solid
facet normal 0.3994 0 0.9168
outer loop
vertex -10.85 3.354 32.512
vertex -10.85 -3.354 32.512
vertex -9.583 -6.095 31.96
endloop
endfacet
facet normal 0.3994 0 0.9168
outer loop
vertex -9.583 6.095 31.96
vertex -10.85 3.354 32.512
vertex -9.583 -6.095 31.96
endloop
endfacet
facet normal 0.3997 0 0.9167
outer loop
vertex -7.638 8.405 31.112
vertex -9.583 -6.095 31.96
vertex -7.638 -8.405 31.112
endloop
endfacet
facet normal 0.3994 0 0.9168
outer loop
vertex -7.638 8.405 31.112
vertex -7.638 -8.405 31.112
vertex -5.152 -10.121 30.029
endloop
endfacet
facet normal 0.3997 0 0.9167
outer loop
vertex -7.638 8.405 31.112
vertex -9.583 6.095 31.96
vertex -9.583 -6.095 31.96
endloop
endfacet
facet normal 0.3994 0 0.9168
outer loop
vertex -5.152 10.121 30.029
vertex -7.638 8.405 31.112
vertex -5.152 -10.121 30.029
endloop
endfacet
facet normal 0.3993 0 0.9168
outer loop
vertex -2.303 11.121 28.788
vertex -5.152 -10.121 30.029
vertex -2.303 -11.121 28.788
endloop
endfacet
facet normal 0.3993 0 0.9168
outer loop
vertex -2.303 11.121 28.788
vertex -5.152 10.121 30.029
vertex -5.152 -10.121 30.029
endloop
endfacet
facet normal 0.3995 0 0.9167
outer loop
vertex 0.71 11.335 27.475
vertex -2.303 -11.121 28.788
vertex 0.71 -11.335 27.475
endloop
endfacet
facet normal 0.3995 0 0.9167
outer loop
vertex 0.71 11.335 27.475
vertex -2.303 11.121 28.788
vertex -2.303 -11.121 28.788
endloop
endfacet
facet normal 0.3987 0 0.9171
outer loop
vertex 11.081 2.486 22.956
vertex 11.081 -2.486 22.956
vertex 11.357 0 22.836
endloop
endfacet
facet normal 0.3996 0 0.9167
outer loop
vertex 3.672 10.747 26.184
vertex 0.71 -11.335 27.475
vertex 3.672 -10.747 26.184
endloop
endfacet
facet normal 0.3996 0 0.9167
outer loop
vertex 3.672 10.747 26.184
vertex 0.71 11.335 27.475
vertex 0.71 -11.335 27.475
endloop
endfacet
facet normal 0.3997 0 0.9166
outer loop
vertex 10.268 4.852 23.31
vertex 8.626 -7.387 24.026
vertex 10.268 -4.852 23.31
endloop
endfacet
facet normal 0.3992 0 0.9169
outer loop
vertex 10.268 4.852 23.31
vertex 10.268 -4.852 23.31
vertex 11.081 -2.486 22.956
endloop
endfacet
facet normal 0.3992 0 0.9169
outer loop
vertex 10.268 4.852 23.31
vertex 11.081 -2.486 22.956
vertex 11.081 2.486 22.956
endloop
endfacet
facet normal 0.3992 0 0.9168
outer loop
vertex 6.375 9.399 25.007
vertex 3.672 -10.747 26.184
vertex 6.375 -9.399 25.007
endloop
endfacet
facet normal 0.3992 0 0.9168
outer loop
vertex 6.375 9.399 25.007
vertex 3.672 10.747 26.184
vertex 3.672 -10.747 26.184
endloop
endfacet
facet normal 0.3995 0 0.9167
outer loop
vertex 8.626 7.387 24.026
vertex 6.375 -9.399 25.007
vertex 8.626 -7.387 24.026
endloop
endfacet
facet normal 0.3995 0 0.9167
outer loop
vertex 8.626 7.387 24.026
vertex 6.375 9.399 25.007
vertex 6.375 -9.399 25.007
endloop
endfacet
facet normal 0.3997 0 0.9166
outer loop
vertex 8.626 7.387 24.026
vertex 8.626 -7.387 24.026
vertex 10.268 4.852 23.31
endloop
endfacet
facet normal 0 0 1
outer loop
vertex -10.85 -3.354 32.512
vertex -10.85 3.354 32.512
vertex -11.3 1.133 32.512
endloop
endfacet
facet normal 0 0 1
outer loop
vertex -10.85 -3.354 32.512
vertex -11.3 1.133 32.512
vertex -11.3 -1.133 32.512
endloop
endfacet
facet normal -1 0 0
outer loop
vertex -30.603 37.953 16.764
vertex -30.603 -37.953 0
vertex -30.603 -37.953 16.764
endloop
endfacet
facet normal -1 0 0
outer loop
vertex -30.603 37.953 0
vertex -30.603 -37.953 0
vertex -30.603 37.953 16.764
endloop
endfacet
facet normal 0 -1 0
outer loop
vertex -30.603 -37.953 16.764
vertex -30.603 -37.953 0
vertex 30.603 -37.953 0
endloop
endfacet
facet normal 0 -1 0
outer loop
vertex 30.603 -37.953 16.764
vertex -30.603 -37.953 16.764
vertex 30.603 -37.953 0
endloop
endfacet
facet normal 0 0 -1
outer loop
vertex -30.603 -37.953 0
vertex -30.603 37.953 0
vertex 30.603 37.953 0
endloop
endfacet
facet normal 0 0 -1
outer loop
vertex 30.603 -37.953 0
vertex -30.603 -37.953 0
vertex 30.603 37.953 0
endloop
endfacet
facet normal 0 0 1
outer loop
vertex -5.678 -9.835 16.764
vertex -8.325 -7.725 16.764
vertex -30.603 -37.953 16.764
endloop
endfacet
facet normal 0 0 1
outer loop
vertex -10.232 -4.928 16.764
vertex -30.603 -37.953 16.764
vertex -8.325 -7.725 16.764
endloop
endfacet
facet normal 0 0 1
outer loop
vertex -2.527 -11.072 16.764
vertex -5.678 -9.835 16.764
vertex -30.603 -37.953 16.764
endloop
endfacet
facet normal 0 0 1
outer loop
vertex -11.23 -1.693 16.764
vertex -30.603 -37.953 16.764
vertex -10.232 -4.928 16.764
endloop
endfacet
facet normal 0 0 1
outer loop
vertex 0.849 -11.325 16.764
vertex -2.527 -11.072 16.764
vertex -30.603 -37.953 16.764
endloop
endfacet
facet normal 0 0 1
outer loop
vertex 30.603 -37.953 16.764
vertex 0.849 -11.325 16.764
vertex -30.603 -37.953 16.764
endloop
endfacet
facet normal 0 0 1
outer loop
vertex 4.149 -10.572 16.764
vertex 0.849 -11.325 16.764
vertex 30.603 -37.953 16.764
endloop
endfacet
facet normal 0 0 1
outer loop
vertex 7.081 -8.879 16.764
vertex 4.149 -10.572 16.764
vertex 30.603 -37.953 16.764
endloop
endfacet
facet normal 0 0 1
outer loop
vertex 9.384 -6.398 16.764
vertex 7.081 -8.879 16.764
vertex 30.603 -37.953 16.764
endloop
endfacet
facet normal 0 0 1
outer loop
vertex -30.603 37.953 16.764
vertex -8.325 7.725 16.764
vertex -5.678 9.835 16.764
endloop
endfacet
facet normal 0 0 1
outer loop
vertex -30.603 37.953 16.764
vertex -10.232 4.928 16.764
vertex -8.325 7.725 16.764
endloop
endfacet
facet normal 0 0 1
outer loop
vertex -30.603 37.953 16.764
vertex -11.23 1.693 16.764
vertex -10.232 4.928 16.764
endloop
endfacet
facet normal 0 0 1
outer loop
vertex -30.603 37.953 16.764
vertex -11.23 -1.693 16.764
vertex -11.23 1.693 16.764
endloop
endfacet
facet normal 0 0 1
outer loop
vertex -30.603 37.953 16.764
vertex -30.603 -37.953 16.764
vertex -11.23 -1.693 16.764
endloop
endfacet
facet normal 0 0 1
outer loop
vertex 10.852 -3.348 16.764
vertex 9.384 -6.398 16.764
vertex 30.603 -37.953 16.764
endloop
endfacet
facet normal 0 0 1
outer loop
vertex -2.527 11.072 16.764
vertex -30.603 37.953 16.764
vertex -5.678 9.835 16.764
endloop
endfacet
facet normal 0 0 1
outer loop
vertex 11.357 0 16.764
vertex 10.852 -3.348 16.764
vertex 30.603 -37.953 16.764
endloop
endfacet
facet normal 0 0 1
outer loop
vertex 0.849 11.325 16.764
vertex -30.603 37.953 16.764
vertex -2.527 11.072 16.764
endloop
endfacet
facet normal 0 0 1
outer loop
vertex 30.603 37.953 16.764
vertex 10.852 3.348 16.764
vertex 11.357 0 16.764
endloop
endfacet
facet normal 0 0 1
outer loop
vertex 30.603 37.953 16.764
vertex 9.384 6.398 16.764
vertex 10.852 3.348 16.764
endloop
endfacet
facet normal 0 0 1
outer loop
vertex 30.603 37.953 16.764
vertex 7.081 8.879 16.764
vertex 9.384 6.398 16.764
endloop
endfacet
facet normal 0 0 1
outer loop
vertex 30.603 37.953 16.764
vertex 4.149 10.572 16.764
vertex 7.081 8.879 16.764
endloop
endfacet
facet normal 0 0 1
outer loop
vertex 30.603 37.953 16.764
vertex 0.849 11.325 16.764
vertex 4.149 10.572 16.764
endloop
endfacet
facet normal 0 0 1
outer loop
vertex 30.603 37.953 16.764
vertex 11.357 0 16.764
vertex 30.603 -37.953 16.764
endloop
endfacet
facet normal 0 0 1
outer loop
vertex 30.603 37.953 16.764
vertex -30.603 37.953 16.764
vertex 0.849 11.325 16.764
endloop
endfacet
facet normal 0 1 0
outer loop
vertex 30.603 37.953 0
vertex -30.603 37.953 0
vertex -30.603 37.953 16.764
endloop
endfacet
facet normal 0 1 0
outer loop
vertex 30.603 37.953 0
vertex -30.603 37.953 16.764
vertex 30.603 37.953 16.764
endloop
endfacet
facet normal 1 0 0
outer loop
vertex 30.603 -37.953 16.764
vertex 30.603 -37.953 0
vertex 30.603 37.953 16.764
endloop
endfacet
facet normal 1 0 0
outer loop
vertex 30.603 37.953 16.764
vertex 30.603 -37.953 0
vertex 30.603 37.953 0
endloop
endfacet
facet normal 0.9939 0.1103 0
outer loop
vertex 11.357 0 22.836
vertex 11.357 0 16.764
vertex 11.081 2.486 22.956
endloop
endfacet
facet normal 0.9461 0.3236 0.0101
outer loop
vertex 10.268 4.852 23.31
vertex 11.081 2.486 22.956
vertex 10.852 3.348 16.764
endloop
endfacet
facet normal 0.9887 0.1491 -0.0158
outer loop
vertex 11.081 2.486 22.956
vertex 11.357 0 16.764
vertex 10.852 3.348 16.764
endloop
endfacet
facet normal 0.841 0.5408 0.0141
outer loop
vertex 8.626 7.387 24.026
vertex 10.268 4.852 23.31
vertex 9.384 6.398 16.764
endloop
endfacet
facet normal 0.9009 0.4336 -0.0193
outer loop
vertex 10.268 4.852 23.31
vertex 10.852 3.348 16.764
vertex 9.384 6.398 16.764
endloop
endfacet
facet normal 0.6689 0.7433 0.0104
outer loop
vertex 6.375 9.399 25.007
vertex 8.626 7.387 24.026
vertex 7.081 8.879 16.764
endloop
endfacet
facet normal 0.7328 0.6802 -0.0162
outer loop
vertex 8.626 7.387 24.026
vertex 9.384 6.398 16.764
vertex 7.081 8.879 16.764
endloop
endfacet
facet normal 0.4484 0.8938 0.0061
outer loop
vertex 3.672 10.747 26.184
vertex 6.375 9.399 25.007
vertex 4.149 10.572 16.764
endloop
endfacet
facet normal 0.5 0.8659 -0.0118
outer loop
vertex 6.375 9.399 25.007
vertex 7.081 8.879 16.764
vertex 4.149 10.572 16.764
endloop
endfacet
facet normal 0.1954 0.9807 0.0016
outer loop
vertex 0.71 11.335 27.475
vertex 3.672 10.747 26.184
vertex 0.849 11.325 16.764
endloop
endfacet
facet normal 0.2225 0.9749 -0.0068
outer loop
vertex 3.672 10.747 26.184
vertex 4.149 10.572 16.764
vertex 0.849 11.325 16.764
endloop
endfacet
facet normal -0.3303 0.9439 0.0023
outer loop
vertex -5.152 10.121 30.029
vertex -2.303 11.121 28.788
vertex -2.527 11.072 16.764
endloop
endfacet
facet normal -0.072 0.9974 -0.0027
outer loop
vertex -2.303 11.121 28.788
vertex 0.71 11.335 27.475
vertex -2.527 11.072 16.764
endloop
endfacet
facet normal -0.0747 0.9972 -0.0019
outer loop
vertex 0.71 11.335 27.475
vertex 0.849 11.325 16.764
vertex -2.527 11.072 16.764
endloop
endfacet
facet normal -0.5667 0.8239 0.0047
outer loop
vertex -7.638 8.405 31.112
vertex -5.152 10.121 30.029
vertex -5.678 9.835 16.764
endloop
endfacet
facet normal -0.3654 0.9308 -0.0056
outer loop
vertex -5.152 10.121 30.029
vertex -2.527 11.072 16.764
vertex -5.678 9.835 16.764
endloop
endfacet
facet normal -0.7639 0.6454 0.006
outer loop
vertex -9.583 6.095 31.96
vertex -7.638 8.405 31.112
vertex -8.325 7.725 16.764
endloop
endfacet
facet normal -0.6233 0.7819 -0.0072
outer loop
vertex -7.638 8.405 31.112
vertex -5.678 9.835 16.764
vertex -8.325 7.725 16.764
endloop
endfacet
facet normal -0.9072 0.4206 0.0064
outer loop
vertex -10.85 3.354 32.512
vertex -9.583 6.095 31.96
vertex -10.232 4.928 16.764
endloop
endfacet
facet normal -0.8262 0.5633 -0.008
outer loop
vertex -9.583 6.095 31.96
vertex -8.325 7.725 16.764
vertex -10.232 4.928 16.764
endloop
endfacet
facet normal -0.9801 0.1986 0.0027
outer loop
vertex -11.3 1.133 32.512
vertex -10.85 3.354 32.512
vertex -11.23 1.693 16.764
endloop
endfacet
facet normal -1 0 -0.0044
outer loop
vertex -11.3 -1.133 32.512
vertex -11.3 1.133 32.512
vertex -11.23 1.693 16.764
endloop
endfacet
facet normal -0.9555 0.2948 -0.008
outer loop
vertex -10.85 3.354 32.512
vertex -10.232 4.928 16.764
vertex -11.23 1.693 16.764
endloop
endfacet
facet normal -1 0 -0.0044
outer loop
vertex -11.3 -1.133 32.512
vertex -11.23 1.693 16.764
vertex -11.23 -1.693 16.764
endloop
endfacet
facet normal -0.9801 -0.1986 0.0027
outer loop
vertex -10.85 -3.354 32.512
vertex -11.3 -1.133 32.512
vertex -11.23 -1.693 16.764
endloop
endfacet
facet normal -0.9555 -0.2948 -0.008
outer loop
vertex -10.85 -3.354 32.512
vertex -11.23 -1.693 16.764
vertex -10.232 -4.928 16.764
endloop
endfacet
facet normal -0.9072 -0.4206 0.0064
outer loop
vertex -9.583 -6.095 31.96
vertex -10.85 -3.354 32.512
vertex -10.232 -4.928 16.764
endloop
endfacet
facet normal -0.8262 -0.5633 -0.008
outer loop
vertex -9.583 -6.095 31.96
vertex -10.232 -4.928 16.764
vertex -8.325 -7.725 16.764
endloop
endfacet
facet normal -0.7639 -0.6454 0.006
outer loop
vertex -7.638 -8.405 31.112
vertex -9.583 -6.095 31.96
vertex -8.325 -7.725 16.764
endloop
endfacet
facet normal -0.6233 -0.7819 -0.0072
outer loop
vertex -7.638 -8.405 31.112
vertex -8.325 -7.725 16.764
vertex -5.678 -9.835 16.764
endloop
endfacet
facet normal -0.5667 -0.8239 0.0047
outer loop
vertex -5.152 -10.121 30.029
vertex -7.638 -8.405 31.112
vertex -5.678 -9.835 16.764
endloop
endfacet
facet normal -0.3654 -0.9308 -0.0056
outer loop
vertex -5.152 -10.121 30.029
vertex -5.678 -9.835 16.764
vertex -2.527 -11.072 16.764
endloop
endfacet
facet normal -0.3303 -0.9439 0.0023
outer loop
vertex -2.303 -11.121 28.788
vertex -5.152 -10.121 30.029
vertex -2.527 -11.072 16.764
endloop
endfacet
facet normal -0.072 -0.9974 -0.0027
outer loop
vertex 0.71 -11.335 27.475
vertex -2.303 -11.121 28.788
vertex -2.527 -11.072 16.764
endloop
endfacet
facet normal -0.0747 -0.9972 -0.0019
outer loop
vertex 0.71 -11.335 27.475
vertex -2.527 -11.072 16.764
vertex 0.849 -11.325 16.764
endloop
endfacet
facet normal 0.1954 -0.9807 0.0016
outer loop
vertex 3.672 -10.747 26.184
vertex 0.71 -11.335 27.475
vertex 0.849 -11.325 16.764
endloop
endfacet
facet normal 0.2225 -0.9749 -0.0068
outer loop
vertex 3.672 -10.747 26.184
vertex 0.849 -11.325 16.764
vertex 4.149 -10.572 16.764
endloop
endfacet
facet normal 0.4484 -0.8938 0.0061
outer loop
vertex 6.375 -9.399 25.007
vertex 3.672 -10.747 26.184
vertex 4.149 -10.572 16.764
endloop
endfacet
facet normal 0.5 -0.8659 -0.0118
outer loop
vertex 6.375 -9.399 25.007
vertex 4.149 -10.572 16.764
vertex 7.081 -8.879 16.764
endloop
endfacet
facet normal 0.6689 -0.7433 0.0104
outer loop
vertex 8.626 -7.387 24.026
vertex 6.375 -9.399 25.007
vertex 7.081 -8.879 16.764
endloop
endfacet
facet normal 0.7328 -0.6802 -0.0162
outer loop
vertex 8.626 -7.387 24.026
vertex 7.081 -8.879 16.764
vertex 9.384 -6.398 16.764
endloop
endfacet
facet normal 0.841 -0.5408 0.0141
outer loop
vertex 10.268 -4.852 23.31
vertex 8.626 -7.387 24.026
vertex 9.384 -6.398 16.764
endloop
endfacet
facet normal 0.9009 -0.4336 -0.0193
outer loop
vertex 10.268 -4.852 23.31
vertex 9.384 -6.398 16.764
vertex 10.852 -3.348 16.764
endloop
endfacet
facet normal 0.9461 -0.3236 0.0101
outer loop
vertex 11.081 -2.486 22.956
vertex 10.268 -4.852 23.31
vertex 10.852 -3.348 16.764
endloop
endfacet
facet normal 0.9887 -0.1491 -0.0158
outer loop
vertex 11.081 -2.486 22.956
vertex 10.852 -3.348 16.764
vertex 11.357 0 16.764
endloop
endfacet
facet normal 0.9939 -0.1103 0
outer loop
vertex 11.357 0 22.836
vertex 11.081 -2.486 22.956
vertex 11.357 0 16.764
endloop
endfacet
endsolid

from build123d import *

# Parameters (mm, degrees)
F0_W          = 61.2063445151
F0_H          = 75.9055092931
F1_DEPTH      = 16.764
F2_R          = 11.3569479506
F3_DEPTH      = 15.748
F5_DEPTH      = 25.4
F5_DEPTH_BACK = 25.4


with BuildPart() as f1:
    # F0 (on Top) → F1 (new body)
    with BuildSketch(Plane.XY):
        Rectangle(F0_W, F0_H)
    extrude(amount=F1_DEPTH)

    # F2 (on face) → F3 (join)
    with BuildSketch(Plane.XY.offset(16.764)):
        Circle(F2_R)
    extrude(amount=F3_DEPTH)

    # F4 (on Front) → F5 (cut, two sides)
    with BuildSketch(Plane.XZ) as f5_sk:
        Polygon((12.6237450168, 32.6778665185), (-11.2310564145, 32.6778665185), (12.6237450168, 22.2839899361), align=None)
    extrude(amount=-F5_DEPTH, mode=Mode.SUBTRACT)
    extrude(f5_sk.sketch, amount=F5_DEPTH_BACK, mode=Mode.SUBTRACT)


solid = f1.part
